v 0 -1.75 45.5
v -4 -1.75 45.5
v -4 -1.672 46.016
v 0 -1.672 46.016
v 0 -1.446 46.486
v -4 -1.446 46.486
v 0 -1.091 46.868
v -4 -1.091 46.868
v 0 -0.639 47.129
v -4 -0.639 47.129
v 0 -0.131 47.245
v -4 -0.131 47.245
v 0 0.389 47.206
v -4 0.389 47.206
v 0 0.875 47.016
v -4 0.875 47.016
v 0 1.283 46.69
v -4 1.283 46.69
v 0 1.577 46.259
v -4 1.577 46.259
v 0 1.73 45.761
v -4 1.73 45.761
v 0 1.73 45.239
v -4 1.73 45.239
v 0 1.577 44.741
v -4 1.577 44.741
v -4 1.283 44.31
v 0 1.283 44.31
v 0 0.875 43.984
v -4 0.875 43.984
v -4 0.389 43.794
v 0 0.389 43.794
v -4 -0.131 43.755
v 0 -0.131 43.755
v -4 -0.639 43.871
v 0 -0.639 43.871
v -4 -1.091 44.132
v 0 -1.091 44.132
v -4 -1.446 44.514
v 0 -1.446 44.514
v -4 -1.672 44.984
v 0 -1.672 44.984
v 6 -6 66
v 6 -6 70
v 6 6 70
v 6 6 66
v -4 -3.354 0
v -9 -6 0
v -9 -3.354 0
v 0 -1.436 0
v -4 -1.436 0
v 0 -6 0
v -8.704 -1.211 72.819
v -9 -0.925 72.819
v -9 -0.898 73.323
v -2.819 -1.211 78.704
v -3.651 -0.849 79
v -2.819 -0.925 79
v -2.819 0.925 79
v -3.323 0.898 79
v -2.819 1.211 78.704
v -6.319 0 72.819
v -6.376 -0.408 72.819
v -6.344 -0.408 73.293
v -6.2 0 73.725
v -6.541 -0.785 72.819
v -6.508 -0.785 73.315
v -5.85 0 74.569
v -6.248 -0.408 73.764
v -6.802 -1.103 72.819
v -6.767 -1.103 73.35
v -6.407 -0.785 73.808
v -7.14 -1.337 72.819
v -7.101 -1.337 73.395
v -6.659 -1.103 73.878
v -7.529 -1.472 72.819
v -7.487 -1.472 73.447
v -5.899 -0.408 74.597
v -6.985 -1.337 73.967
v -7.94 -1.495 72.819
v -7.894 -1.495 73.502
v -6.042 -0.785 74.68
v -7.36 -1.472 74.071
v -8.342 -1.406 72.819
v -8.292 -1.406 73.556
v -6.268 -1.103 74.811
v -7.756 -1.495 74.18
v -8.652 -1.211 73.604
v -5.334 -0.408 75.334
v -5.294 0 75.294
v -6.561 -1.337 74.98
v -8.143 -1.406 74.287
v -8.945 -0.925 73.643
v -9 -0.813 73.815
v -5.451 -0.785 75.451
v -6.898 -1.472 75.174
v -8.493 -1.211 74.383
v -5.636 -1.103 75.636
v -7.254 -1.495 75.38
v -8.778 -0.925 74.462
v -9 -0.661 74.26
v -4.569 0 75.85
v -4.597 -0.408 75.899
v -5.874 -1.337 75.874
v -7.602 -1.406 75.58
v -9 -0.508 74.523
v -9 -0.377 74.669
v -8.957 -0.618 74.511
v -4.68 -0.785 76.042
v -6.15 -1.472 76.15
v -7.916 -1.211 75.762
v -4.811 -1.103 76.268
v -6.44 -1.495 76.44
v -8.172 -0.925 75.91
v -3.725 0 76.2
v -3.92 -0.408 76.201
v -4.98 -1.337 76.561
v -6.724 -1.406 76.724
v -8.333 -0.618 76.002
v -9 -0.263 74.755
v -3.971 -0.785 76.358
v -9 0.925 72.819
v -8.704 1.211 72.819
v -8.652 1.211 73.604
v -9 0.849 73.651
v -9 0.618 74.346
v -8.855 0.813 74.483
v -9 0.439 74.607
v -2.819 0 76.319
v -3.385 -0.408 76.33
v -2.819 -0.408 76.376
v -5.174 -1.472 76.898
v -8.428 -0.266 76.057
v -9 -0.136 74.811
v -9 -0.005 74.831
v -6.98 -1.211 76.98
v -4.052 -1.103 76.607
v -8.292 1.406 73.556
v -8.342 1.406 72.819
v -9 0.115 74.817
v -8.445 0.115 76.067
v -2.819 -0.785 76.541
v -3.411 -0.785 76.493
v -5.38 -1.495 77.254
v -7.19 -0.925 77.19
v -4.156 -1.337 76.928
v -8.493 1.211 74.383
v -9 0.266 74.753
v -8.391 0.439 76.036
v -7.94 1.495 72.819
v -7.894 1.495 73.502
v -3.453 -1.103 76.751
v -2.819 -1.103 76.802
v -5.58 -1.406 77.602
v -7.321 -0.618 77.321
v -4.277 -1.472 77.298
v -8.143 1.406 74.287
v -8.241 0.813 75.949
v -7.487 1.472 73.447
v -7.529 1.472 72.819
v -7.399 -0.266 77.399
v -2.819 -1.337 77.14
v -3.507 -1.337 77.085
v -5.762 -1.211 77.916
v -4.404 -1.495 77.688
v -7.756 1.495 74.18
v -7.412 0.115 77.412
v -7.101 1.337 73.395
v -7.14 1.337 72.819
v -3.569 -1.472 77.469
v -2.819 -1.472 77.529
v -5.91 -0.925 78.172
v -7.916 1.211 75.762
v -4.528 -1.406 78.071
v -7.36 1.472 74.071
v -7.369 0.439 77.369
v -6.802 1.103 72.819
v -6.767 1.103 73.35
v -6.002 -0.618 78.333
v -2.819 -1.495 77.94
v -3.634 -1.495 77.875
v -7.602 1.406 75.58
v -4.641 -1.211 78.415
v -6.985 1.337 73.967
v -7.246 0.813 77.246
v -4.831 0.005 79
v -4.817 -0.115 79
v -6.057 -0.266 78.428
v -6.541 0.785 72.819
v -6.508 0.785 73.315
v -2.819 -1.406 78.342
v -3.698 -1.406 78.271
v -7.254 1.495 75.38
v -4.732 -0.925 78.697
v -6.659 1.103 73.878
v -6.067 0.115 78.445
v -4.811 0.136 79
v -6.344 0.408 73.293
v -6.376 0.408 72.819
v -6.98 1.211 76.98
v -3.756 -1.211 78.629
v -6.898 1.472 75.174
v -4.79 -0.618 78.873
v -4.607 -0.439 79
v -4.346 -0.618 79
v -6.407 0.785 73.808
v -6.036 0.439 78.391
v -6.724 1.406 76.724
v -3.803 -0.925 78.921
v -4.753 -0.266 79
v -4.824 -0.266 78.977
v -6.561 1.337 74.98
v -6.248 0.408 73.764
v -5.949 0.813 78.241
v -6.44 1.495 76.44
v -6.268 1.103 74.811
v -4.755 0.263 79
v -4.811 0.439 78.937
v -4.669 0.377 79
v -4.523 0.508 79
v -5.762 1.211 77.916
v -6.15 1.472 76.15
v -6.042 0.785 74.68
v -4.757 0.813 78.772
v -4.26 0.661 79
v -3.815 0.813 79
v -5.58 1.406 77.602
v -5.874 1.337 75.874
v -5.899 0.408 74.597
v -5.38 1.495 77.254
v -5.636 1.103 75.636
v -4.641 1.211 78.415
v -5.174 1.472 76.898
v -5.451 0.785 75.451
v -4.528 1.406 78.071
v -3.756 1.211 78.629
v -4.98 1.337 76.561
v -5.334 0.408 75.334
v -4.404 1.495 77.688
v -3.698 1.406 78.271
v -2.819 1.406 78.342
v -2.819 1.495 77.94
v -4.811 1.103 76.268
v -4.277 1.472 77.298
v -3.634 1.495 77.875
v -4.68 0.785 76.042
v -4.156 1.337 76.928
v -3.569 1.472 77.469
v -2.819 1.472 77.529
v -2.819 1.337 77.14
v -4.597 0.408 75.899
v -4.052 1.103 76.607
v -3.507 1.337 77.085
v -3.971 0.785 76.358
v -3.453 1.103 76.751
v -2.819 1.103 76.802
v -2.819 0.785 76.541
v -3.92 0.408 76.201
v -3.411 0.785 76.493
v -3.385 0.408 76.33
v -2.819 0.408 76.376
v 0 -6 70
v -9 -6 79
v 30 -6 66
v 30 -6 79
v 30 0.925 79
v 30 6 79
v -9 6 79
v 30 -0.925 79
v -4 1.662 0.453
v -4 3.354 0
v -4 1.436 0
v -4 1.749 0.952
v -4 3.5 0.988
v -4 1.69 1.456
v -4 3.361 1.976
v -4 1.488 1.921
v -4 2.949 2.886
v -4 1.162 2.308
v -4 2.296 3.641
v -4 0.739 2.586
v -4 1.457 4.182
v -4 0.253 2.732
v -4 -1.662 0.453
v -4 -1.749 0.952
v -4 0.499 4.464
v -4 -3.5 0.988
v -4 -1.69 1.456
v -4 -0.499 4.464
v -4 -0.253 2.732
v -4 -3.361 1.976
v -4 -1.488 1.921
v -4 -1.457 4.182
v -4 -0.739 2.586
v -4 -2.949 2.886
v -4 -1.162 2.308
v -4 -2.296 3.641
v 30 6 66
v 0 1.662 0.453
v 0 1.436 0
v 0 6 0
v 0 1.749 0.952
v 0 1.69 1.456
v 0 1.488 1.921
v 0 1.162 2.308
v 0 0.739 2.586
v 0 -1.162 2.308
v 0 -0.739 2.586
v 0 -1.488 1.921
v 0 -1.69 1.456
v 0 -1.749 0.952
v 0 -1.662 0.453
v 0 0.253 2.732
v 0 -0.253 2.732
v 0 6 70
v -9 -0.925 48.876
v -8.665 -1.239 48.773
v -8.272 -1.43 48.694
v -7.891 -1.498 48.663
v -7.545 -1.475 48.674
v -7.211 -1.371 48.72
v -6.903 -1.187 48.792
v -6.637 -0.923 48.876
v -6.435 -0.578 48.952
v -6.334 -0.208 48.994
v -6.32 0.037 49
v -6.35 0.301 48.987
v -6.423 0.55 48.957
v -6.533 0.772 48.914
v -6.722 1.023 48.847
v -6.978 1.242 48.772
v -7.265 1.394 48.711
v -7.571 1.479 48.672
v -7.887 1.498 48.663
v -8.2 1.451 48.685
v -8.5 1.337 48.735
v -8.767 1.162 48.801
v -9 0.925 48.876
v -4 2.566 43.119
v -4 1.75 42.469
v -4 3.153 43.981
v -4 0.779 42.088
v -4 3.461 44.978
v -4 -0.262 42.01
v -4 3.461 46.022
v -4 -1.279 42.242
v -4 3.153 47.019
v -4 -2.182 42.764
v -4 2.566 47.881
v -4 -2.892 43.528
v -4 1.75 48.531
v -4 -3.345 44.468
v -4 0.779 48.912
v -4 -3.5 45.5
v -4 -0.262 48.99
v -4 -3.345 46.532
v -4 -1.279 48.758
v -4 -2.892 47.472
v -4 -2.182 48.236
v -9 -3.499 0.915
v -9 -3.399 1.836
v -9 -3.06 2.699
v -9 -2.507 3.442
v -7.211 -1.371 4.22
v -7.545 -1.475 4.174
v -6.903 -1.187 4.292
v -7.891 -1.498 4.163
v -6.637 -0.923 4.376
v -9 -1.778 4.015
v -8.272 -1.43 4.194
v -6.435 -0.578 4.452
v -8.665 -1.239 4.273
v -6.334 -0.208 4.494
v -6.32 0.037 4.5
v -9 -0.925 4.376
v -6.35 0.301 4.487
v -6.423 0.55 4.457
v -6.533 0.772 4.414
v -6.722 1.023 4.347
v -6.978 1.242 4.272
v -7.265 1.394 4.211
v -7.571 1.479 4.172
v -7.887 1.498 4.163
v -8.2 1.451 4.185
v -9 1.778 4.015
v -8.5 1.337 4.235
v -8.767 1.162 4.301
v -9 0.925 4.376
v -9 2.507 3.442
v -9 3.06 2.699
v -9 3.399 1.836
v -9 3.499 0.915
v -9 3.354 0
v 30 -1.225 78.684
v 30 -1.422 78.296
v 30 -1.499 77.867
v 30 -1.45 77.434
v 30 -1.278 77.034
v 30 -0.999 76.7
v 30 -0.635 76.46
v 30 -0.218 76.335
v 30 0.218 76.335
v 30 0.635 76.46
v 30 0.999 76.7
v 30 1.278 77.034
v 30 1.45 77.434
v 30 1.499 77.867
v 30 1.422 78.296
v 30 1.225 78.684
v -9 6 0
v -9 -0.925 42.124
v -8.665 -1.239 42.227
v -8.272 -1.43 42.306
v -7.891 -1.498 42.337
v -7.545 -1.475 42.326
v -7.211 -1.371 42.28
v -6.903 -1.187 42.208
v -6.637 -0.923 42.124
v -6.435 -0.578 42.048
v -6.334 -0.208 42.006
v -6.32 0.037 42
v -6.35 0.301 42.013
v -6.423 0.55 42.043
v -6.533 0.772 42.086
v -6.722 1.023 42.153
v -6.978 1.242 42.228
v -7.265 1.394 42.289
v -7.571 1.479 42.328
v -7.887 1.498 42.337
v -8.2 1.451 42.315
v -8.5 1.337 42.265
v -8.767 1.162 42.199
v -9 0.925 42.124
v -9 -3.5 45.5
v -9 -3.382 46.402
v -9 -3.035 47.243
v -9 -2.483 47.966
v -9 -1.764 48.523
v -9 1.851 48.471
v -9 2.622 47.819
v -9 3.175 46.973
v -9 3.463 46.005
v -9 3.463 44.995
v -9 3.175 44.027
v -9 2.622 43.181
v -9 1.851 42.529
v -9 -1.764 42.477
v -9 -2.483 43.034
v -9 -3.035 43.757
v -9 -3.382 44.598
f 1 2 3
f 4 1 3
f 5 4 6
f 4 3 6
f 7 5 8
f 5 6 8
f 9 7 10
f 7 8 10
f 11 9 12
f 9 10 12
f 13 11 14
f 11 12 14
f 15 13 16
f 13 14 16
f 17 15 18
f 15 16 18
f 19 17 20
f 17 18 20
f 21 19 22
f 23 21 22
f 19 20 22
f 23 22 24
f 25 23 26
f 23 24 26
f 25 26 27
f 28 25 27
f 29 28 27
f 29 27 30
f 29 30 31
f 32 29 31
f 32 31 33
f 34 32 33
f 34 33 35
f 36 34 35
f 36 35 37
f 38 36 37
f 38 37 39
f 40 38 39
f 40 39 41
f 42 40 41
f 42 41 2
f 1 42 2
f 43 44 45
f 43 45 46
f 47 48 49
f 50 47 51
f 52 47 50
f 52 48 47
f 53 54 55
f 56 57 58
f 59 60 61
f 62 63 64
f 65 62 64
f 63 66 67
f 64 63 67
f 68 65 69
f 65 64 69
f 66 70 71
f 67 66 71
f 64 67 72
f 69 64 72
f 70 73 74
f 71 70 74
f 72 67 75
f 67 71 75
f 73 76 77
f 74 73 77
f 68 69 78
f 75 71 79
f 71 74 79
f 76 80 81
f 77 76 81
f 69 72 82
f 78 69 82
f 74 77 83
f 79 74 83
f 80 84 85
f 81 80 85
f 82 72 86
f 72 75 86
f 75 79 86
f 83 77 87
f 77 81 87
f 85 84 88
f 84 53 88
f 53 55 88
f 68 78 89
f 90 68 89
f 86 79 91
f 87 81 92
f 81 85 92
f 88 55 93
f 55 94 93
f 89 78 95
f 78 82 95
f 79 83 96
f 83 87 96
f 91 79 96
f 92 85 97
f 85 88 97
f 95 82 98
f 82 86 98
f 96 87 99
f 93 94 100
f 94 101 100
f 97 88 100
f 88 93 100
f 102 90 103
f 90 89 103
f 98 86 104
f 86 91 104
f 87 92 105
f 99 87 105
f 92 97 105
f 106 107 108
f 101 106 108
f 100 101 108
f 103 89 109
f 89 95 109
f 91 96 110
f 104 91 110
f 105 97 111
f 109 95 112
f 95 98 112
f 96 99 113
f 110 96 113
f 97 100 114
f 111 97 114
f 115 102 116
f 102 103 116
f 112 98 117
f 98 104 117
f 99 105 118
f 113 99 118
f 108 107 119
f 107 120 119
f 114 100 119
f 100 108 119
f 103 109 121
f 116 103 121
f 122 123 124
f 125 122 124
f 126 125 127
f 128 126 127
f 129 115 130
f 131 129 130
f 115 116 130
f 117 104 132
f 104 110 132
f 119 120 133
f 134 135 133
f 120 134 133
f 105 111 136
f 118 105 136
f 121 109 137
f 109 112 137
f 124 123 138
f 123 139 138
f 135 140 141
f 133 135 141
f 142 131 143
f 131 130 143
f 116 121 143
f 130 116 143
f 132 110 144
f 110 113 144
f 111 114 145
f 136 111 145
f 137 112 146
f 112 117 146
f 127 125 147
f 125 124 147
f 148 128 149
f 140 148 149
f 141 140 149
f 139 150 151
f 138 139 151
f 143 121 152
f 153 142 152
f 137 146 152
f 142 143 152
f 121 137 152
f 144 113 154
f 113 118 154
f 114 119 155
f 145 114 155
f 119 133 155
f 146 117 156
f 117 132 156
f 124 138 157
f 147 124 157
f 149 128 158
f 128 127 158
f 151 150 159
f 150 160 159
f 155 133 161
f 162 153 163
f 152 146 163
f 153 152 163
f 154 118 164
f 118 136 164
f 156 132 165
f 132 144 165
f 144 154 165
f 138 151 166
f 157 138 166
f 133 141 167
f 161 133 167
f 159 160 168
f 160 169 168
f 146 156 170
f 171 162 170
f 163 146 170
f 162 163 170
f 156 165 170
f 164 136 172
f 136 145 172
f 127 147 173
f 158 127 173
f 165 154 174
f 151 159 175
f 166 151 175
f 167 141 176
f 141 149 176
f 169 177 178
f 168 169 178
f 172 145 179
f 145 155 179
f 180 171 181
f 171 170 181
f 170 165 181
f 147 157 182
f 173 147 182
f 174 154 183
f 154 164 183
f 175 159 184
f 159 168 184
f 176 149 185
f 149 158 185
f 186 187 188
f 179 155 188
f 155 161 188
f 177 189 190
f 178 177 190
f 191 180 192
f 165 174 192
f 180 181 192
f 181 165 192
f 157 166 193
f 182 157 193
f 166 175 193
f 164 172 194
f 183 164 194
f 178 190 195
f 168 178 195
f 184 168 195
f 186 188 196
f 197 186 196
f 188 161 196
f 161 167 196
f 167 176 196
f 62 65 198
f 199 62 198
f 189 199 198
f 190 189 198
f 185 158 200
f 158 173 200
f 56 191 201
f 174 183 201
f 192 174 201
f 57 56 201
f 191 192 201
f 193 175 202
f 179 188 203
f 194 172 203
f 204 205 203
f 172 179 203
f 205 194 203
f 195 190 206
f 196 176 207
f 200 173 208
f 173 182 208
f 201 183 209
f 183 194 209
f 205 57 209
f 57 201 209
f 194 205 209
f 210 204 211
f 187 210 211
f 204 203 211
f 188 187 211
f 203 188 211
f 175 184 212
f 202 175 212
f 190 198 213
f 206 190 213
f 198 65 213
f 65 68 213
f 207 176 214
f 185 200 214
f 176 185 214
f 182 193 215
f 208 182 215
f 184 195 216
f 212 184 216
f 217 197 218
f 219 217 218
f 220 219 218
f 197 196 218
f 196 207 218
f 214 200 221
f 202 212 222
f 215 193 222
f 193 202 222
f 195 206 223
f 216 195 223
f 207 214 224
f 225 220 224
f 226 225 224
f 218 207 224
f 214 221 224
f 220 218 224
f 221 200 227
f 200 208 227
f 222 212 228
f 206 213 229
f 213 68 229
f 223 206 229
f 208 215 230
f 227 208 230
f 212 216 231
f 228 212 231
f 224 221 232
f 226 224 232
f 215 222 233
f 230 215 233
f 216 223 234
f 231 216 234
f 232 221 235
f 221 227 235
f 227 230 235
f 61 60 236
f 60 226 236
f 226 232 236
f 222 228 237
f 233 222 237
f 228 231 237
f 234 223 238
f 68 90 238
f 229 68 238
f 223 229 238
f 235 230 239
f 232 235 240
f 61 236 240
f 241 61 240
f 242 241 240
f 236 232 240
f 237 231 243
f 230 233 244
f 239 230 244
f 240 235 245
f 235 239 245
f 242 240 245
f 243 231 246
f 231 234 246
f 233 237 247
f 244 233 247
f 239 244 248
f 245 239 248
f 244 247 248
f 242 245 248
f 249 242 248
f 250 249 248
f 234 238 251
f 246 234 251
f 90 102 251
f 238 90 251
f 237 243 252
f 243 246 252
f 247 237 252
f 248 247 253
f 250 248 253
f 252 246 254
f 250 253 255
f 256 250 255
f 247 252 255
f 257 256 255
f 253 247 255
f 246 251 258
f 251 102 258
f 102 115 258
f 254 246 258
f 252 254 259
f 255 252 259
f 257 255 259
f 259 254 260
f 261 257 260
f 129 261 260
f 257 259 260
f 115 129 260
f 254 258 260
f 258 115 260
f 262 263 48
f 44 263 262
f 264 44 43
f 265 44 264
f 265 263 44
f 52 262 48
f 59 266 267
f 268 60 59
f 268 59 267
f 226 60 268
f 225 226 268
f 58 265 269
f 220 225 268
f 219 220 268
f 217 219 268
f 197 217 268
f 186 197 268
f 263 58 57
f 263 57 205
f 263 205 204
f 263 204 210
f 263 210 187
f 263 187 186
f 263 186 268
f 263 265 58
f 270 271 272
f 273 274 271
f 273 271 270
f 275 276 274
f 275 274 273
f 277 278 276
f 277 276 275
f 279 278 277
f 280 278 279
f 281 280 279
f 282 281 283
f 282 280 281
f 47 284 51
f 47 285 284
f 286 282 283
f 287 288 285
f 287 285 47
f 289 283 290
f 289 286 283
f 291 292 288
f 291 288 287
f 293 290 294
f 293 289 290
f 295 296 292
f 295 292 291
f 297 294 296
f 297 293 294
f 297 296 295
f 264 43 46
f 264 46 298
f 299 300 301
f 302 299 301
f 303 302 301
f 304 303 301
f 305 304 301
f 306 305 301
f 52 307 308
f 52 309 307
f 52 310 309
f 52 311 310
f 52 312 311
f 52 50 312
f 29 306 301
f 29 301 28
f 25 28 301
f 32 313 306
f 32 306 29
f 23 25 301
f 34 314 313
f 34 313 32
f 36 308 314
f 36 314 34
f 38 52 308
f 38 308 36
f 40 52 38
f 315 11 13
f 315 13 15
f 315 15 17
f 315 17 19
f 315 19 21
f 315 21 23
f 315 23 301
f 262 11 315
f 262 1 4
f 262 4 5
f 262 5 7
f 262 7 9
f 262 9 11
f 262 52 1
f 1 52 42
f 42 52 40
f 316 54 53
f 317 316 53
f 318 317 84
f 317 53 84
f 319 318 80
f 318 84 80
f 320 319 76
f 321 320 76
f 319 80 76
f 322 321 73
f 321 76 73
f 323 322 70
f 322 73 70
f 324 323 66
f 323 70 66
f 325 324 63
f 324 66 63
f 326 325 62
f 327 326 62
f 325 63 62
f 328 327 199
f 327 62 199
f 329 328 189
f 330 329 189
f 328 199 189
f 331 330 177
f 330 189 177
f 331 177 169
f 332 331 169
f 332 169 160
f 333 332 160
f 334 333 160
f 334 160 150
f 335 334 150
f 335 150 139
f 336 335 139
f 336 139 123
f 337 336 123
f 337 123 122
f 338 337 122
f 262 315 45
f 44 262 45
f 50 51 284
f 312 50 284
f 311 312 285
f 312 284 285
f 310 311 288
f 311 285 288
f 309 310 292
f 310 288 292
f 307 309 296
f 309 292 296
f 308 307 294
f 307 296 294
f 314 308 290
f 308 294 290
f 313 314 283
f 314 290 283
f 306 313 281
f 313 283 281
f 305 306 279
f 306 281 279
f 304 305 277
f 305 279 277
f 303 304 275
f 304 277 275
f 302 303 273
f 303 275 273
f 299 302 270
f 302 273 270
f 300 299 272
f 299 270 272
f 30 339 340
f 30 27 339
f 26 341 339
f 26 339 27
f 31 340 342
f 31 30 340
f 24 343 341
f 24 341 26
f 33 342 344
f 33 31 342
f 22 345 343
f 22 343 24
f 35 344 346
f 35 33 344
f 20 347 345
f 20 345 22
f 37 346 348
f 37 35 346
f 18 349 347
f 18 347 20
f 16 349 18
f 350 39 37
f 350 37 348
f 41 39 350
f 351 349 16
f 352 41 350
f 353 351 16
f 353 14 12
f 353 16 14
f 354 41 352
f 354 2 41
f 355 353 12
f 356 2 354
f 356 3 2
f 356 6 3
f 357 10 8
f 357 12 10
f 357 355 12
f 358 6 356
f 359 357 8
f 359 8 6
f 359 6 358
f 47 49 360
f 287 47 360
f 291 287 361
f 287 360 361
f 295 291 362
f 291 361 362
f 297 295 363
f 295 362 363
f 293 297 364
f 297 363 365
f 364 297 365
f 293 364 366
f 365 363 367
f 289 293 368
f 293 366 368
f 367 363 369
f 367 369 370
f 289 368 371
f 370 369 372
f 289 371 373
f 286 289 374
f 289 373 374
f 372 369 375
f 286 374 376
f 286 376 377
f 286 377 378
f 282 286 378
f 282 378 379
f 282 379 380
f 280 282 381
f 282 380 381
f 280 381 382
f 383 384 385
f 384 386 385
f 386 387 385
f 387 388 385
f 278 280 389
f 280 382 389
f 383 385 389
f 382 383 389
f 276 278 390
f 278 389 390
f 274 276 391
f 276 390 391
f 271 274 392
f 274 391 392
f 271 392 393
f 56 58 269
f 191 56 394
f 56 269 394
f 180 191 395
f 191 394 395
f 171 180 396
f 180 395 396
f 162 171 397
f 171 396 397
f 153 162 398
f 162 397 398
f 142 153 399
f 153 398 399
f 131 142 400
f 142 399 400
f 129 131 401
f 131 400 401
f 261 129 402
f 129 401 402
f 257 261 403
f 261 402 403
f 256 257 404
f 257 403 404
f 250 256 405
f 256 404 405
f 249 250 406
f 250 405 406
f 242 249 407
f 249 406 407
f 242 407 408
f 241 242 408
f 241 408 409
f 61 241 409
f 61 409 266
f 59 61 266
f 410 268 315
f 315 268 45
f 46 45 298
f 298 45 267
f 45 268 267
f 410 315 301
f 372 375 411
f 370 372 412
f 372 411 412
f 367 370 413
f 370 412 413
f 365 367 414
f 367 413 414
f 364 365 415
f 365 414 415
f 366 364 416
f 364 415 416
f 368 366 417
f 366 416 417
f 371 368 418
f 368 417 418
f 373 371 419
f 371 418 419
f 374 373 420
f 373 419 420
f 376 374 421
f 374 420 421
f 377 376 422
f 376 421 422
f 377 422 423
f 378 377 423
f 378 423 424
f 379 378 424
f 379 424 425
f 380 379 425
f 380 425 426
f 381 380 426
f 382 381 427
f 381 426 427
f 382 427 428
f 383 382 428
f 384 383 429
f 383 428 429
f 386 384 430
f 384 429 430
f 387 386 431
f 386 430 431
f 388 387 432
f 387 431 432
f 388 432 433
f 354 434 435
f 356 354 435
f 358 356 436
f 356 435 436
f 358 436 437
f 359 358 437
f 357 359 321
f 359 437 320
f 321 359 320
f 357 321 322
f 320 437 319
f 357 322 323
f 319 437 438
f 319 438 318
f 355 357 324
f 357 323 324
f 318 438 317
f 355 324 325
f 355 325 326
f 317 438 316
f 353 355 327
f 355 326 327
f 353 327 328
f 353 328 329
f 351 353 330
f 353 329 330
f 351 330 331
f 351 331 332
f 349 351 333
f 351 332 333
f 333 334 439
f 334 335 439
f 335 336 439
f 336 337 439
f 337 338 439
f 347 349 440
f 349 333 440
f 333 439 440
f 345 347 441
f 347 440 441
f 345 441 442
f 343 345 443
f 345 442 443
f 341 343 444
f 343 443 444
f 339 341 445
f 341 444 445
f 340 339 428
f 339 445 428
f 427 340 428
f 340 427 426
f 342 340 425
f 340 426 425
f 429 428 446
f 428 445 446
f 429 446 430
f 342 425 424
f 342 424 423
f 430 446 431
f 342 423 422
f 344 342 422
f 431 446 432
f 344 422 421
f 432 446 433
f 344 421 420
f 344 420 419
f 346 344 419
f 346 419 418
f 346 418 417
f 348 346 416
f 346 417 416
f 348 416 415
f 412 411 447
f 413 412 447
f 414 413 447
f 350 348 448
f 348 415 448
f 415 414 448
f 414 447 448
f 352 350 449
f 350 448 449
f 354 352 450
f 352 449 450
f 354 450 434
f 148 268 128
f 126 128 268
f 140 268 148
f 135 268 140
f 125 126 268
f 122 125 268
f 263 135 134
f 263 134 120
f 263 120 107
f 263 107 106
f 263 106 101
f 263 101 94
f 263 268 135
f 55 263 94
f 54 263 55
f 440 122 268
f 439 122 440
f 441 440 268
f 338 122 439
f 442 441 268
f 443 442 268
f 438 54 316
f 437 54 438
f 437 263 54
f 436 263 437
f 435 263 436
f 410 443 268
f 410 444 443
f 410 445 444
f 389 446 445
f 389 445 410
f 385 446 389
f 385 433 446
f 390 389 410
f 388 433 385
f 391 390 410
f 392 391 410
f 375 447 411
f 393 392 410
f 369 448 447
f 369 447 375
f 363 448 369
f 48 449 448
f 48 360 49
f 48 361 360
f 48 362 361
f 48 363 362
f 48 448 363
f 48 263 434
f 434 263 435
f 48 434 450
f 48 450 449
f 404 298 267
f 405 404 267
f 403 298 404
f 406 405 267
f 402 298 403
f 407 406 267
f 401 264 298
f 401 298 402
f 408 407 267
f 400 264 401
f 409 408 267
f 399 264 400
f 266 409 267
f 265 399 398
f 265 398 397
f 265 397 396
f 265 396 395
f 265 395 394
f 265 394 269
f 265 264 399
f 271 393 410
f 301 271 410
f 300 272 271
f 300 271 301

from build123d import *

# Parameters (mm, degrees)
F2_DEPTH = 6
F3_R     = 1.5
F6_R     = 1.75
F7_DEPTH = 9
F8_R     = 3.5
F9_DEPTH = 5


with BuildPart() as f2:
    # F1 (on Front) → F2 (new body, symmetric)
    with BuildSketch(Plane.XZ):
        Polygon((-9, 0), (0, 0), (0, 70), (6, 70), (6, 66), (30, 66), (30, 79), (-9, 79), align=None)
    extrude(amount=F2_DEPTH, both=True)

    # F5: sweep along a path in F4
    with BuildLine(Plane.XZ) as f5_path:
        Line((-7.8191634321, 0), (-7.8191634321, 72.8191634321))
        ThreePointArc((-7.8191634321, 72.8191634321), (-6.3546973381, 76.3546973381), (-2.8191634321, 77.8191634321))
        Line((-2.8191634321, 77.8191634321), (30, 77.8191634321))
    # F3 (on face) → F5 (sweep, cut)
    with BuildSketch(Plane(origin=(0, 0, 0), x_dir=(1, 0, 0), z_dir=(0, 0, -1))):
        with Locations((-7.8191634321, 0)):
            Circle(F3_R)
    sweep(path=f5_path.line, mode=Mode.SUBTRACT)

    # F6 (on face) → F7 (cut, through all)
    with BuildSketch(Plane(origin=(-9, 0, 0), x_dir=(0, -1, 0), z_dir=(-1, 0, 0))):
        with Locations((0, 45.5)):
            Circle(F6_R)
        with Locations((0, 1)):
            Circle(F6_R)
    extrude(amount=-F7_DEPTH, mode=Mode.SUBTRACT)

    # F8 (on face) → F9 (cut)
    with BuildSketch(Plane(origin=(-9, 0, 0), x_dir=(0, -1, 0), z_dir=(-1, 0, 0))):
        with Locations((0, 45.5)):
            Circle(F8_R)
        with Locations((0, 1)):
            Circle(F8_R)
    extrude(amount=-F9_DEPTH, mode=Mode.SUBTRACT)


solid = f2.part
